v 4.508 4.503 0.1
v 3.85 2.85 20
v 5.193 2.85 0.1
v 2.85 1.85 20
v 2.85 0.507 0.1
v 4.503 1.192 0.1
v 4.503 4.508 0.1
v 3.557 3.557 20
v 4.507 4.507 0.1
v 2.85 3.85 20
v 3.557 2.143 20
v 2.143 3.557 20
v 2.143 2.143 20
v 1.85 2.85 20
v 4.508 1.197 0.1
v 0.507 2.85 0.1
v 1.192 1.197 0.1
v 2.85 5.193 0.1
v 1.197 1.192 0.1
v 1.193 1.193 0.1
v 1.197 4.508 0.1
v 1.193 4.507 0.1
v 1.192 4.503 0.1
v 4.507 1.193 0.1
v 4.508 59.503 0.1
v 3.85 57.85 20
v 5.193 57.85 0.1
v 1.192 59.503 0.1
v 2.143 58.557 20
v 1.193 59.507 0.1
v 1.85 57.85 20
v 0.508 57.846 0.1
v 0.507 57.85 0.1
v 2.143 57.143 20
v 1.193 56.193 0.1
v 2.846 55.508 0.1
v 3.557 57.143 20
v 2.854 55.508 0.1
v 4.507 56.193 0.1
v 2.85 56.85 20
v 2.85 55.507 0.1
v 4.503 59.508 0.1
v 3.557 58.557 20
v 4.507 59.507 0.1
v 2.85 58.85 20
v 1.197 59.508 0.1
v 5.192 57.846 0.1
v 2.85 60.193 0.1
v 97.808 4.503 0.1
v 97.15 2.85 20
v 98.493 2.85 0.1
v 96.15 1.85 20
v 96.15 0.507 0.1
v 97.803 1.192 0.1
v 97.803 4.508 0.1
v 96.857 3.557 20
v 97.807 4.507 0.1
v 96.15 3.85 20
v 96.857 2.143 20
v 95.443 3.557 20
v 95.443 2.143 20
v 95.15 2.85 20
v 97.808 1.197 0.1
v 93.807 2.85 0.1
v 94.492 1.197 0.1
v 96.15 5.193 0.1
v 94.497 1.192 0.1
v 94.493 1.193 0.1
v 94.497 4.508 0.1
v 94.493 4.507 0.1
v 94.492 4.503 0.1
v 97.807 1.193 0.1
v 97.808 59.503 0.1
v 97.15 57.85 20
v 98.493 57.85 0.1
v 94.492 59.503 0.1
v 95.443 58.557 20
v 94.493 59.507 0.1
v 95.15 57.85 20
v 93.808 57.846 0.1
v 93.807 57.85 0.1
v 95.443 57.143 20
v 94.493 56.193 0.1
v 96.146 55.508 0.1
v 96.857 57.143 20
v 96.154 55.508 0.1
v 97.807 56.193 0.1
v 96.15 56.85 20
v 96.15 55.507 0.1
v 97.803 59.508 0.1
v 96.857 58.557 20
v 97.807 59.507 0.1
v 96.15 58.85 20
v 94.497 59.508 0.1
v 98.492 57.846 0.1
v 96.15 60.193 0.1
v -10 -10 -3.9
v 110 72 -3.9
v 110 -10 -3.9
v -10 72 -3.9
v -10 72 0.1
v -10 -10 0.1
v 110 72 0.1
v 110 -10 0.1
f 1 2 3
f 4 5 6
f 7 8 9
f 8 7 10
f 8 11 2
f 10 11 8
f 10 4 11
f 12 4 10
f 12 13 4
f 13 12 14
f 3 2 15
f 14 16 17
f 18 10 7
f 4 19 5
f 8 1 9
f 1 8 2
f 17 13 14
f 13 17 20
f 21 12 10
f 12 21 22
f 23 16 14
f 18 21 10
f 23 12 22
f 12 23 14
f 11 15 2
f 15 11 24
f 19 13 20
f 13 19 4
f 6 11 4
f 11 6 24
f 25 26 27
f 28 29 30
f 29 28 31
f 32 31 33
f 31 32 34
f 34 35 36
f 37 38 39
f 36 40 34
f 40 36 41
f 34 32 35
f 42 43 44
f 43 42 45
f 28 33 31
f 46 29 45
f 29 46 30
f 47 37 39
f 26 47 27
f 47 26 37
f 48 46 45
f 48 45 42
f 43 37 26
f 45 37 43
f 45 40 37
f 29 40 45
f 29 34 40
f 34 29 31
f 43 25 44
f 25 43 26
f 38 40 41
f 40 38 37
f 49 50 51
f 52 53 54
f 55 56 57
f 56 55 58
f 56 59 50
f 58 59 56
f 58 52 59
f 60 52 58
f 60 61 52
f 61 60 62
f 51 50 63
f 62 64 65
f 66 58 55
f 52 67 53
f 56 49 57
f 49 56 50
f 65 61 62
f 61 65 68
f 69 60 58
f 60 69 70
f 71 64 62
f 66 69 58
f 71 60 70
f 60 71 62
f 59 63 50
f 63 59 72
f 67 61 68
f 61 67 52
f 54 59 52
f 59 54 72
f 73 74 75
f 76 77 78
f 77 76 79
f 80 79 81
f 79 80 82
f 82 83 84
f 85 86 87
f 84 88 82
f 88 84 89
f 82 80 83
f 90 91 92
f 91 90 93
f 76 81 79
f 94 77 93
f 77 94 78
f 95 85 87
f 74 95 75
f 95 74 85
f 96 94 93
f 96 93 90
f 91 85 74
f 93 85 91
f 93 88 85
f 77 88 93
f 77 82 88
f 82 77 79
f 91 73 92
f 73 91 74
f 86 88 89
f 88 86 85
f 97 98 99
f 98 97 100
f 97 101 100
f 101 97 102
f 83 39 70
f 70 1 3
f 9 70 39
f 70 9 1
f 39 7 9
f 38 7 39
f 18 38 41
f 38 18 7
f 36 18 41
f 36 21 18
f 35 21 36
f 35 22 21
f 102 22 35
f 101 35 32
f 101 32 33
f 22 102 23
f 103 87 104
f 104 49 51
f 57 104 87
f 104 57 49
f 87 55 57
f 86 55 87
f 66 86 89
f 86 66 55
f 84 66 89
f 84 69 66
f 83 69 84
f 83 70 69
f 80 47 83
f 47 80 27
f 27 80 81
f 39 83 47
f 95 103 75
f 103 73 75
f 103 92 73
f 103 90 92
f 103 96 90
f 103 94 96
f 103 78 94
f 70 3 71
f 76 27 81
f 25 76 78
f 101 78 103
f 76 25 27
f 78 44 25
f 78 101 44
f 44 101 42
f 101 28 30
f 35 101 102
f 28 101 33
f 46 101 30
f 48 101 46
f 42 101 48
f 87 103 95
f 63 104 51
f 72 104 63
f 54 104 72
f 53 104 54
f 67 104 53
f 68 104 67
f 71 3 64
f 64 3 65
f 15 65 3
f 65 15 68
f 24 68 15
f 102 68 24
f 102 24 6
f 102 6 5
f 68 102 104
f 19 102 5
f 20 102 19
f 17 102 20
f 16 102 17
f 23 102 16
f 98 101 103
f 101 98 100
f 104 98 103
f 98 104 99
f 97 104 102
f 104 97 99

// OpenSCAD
BOARD_X = 100;
BOARD_Y = 62;
BOARD_Z = 30;
HOLE_DIAMETER = 1.35;
HOLE_DISTANCE_FROM_VERTEX = 0.5;
SPACE_X_BETWEEN_HOLES = 93.3;
 SPACE_Y_BETWEEN_HOLES = 55;
HOLDER_BASE = HOLE_DIAMETER + 1;

BIG_OFFSET = 20;
ENCLOSURE_LAYER = 4;


module main(){
  board_base_with_holders();
}

module board_base_with_holders(){
  translate([0,0,-ENCLOSURE_LAYER + 0.1])
  board_base();

  holders_pair();
}

module board_base(){
  linear_extrude(ENCLOSURE_LAYER)
    translate([-BIG_OFFSET/2, -BIG_OFFSET/2])
    square([BOARD_X + BIG_OFFSET, BOARD_Y + BIG_OFFSET]);
}

module holders_pair(){
  _holders_row();

  translate([SPACE_X_BETWEEN_HOLES, 0, 0])
  _holders_row();  

}

module _holders_row(){
  translate([HOLE_DISTANCE_FROM_VERTEX + HOLDER_BASE, HOLE_DISTANCE_FROM_VERTEX + HOLDER_BASE, 0]){
    _board_holder();
    
    translate([0, SPACE_Y_BETWEEN_HOLES, 0])    
    _board_holder();  
  }
}

module _board_holder(){
  cylinder(r1=HOLDER_BASE, r2=1, h=BOARD_Z/1.5);
}


main();
